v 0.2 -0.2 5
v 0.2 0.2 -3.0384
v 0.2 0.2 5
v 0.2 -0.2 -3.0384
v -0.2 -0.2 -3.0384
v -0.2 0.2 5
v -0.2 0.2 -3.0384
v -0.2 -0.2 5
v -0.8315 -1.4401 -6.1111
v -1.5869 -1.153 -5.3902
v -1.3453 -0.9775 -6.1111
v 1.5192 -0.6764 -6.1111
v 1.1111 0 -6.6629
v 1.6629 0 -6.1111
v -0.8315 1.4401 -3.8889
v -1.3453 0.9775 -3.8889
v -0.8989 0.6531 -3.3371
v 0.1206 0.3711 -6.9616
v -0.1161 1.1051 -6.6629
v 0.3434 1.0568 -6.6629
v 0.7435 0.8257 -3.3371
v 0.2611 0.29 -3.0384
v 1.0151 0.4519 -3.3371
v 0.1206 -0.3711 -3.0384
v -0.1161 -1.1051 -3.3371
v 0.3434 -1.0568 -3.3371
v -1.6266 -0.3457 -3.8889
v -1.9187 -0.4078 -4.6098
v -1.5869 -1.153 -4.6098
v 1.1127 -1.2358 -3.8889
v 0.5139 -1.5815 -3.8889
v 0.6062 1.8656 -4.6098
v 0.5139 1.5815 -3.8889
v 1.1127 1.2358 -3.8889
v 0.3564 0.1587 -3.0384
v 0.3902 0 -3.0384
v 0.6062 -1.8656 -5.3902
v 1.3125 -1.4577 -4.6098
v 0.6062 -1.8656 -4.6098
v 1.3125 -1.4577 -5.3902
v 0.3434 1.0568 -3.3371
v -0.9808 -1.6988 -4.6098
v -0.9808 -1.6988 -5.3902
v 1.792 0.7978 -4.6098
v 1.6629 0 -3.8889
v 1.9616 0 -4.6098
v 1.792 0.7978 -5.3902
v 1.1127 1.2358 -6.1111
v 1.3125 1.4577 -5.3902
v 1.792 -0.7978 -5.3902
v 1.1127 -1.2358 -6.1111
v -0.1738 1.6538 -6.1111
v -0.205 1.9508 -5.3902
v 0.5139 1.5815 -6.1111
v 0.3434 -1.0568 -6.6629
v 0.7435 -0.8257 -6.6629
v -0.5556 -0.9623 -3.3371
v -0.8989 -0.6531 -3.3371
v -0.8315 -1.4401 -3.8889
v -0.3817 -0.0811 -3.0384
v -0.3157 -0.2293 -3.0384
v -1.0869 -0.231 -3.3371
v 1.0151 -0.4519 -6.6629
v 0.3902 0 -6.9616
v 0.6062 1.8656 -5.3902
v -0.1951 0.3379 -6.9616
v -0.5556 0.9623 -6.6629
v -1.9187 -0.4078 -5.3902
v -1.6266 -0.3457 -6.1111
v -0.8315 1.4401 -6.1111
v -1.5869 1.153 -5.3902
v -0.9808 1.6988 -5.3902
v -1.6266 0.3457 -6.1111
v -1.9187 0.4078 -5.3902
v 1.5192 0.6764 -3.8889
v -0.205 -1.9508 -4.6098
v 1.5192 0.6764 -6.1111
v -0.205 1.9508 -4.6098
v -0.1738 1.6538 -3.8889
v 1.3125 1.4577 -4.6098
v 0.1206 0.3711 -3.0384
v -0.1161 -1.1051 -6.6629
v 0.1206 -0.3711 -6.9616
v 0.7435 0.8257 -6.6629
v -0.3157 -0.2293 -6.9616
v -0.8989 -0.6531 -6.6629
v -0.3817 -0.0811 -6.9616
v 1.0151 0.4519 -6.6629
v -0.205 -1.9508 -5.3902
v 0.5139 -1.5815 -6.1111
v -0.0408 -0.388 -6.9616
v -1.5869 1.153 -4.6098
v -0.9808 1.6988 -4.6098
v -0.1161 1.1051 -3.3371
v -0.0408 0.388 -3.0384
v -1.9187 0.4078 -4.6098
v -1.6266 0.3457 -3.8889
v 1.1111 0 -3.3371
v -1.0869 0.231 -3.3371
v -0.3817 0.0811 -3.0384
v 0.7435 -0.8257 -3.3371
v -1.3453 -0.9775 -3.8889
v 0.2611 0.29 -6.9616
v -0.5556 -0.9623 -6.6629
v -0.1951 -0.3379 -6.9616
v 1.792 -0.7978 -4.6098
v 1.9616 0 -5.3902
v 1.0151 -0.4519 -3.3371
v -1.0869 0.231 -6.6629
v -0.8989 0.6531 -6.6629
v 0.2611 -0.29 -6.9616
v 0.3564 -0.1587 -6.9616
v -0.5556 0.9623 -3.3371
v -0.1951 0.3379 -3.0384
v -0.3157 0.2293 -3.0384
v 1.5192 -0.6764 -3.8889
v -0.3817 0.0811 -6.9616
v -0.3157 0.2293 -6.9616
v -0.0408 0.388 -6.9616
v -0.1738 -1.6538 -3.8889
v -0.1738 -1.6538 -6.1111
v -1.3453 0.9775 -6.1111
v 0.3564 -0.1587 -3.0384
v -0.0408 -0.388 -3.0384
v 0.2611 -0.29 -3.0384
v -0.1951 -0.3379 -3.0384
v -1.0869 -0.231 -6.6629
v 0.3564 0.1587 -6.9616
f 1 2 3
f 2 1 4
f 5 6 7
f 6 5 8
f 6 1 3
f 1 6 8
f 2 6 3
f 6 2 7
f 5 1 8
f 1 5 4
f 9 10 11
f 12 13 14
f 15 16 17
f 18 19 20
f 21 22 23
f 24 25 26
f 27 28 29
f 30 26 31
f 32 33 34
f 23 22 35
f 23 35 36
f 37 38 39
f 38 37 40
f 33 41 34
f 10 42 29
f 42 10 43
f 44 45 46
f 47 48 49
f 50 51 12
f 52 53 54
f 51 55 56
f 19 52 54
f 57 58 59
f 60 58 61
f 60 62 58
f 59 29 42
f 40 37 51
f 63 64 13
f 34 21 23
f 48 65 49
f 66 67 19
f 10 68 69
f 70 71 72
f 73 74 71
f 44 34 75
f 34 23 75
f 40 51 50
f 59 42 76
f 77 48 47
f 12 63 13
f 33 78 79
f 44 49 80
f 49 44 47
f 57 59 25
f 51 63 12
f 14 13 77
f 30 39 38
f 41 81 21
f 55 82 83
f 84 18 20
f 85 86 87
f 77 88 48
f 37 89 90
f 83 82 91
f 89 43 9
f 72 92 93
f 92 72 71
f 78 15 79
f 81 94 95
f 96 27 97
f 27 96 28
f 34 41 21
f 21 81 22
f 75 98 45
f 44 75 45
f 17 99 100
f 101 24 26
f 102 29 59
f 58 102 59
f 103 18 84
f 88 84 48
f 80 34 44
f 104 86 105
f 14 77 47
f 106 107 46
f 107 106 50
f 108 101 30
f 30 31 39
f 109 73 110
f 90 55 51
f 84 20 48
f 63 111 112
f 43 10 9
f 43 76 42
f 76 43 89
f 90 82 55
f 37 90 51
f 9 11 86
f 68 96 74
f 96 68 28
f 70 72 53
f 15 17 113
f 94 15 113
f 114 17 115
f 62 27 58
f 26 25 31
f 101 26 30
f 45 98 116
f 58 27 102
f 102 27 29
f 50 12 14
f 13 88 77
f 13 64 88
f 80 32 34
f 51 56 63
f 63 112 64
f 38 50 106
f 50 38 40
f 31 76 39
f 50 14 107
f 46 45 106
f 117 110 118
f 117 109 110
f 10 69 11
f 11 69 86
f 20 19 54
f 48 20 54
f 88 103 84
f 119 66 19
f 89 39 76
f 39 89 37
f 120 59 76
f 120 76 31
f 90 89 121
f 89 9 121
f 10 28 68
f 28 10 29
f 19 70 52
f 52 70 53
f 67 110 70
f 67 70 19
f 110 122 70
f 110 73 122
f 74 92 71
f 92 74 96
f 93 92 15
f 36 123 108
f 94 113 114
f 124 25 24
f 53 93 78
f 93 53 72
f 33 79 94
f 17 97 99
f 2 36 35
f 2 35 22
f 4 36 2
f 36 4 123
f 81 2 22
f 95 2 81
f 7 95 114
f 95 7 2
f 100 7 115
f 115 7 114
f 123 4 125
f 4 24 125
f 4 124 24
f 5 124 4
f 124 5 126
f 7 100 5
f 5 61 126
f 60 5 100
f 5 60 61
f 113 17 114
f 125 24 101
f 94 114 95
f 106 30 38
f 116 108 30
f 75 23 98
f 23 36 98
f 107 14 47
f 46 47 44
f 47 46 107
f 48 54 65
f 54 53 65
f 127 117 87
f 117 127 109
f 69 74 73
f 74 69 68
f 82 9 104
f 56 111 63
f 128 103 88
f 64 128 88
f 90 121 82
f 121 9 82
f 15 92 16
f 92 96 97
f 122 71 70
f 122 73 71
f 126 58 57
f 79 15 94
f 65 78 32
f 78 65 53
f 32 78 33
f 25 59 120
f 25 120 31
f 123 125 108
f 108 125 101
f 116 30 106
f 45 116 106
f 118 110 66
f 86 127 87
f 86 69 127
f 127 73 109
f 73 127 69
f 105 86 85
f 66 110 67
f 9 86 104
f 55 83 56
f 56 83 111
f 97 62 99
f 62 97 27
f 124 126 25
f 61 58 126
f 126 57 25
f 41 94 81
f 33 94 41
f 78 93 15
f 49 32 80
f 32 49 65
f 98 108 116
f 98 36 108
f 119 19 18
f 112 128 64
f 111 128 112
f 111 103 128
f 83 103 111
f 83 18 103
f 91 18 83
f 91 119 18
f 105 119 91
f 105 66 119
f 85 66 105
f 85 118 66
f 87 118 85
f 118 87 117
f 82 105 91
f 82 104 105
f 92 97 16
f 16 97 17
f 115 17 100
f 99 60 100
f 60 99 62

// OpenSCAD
color("brown")
rotate([0,90,0])
cube([10,0.4,0.4], center = true);


color("gray")
translate([0,0,-4])
rotate([0,0,0])
cube([0.5,0.5,0.4], center = true, $fn=10);


color("brown")
translate([0,0,-5])
rotate([0,0,0])
sphere(r=2, $fn=15);
